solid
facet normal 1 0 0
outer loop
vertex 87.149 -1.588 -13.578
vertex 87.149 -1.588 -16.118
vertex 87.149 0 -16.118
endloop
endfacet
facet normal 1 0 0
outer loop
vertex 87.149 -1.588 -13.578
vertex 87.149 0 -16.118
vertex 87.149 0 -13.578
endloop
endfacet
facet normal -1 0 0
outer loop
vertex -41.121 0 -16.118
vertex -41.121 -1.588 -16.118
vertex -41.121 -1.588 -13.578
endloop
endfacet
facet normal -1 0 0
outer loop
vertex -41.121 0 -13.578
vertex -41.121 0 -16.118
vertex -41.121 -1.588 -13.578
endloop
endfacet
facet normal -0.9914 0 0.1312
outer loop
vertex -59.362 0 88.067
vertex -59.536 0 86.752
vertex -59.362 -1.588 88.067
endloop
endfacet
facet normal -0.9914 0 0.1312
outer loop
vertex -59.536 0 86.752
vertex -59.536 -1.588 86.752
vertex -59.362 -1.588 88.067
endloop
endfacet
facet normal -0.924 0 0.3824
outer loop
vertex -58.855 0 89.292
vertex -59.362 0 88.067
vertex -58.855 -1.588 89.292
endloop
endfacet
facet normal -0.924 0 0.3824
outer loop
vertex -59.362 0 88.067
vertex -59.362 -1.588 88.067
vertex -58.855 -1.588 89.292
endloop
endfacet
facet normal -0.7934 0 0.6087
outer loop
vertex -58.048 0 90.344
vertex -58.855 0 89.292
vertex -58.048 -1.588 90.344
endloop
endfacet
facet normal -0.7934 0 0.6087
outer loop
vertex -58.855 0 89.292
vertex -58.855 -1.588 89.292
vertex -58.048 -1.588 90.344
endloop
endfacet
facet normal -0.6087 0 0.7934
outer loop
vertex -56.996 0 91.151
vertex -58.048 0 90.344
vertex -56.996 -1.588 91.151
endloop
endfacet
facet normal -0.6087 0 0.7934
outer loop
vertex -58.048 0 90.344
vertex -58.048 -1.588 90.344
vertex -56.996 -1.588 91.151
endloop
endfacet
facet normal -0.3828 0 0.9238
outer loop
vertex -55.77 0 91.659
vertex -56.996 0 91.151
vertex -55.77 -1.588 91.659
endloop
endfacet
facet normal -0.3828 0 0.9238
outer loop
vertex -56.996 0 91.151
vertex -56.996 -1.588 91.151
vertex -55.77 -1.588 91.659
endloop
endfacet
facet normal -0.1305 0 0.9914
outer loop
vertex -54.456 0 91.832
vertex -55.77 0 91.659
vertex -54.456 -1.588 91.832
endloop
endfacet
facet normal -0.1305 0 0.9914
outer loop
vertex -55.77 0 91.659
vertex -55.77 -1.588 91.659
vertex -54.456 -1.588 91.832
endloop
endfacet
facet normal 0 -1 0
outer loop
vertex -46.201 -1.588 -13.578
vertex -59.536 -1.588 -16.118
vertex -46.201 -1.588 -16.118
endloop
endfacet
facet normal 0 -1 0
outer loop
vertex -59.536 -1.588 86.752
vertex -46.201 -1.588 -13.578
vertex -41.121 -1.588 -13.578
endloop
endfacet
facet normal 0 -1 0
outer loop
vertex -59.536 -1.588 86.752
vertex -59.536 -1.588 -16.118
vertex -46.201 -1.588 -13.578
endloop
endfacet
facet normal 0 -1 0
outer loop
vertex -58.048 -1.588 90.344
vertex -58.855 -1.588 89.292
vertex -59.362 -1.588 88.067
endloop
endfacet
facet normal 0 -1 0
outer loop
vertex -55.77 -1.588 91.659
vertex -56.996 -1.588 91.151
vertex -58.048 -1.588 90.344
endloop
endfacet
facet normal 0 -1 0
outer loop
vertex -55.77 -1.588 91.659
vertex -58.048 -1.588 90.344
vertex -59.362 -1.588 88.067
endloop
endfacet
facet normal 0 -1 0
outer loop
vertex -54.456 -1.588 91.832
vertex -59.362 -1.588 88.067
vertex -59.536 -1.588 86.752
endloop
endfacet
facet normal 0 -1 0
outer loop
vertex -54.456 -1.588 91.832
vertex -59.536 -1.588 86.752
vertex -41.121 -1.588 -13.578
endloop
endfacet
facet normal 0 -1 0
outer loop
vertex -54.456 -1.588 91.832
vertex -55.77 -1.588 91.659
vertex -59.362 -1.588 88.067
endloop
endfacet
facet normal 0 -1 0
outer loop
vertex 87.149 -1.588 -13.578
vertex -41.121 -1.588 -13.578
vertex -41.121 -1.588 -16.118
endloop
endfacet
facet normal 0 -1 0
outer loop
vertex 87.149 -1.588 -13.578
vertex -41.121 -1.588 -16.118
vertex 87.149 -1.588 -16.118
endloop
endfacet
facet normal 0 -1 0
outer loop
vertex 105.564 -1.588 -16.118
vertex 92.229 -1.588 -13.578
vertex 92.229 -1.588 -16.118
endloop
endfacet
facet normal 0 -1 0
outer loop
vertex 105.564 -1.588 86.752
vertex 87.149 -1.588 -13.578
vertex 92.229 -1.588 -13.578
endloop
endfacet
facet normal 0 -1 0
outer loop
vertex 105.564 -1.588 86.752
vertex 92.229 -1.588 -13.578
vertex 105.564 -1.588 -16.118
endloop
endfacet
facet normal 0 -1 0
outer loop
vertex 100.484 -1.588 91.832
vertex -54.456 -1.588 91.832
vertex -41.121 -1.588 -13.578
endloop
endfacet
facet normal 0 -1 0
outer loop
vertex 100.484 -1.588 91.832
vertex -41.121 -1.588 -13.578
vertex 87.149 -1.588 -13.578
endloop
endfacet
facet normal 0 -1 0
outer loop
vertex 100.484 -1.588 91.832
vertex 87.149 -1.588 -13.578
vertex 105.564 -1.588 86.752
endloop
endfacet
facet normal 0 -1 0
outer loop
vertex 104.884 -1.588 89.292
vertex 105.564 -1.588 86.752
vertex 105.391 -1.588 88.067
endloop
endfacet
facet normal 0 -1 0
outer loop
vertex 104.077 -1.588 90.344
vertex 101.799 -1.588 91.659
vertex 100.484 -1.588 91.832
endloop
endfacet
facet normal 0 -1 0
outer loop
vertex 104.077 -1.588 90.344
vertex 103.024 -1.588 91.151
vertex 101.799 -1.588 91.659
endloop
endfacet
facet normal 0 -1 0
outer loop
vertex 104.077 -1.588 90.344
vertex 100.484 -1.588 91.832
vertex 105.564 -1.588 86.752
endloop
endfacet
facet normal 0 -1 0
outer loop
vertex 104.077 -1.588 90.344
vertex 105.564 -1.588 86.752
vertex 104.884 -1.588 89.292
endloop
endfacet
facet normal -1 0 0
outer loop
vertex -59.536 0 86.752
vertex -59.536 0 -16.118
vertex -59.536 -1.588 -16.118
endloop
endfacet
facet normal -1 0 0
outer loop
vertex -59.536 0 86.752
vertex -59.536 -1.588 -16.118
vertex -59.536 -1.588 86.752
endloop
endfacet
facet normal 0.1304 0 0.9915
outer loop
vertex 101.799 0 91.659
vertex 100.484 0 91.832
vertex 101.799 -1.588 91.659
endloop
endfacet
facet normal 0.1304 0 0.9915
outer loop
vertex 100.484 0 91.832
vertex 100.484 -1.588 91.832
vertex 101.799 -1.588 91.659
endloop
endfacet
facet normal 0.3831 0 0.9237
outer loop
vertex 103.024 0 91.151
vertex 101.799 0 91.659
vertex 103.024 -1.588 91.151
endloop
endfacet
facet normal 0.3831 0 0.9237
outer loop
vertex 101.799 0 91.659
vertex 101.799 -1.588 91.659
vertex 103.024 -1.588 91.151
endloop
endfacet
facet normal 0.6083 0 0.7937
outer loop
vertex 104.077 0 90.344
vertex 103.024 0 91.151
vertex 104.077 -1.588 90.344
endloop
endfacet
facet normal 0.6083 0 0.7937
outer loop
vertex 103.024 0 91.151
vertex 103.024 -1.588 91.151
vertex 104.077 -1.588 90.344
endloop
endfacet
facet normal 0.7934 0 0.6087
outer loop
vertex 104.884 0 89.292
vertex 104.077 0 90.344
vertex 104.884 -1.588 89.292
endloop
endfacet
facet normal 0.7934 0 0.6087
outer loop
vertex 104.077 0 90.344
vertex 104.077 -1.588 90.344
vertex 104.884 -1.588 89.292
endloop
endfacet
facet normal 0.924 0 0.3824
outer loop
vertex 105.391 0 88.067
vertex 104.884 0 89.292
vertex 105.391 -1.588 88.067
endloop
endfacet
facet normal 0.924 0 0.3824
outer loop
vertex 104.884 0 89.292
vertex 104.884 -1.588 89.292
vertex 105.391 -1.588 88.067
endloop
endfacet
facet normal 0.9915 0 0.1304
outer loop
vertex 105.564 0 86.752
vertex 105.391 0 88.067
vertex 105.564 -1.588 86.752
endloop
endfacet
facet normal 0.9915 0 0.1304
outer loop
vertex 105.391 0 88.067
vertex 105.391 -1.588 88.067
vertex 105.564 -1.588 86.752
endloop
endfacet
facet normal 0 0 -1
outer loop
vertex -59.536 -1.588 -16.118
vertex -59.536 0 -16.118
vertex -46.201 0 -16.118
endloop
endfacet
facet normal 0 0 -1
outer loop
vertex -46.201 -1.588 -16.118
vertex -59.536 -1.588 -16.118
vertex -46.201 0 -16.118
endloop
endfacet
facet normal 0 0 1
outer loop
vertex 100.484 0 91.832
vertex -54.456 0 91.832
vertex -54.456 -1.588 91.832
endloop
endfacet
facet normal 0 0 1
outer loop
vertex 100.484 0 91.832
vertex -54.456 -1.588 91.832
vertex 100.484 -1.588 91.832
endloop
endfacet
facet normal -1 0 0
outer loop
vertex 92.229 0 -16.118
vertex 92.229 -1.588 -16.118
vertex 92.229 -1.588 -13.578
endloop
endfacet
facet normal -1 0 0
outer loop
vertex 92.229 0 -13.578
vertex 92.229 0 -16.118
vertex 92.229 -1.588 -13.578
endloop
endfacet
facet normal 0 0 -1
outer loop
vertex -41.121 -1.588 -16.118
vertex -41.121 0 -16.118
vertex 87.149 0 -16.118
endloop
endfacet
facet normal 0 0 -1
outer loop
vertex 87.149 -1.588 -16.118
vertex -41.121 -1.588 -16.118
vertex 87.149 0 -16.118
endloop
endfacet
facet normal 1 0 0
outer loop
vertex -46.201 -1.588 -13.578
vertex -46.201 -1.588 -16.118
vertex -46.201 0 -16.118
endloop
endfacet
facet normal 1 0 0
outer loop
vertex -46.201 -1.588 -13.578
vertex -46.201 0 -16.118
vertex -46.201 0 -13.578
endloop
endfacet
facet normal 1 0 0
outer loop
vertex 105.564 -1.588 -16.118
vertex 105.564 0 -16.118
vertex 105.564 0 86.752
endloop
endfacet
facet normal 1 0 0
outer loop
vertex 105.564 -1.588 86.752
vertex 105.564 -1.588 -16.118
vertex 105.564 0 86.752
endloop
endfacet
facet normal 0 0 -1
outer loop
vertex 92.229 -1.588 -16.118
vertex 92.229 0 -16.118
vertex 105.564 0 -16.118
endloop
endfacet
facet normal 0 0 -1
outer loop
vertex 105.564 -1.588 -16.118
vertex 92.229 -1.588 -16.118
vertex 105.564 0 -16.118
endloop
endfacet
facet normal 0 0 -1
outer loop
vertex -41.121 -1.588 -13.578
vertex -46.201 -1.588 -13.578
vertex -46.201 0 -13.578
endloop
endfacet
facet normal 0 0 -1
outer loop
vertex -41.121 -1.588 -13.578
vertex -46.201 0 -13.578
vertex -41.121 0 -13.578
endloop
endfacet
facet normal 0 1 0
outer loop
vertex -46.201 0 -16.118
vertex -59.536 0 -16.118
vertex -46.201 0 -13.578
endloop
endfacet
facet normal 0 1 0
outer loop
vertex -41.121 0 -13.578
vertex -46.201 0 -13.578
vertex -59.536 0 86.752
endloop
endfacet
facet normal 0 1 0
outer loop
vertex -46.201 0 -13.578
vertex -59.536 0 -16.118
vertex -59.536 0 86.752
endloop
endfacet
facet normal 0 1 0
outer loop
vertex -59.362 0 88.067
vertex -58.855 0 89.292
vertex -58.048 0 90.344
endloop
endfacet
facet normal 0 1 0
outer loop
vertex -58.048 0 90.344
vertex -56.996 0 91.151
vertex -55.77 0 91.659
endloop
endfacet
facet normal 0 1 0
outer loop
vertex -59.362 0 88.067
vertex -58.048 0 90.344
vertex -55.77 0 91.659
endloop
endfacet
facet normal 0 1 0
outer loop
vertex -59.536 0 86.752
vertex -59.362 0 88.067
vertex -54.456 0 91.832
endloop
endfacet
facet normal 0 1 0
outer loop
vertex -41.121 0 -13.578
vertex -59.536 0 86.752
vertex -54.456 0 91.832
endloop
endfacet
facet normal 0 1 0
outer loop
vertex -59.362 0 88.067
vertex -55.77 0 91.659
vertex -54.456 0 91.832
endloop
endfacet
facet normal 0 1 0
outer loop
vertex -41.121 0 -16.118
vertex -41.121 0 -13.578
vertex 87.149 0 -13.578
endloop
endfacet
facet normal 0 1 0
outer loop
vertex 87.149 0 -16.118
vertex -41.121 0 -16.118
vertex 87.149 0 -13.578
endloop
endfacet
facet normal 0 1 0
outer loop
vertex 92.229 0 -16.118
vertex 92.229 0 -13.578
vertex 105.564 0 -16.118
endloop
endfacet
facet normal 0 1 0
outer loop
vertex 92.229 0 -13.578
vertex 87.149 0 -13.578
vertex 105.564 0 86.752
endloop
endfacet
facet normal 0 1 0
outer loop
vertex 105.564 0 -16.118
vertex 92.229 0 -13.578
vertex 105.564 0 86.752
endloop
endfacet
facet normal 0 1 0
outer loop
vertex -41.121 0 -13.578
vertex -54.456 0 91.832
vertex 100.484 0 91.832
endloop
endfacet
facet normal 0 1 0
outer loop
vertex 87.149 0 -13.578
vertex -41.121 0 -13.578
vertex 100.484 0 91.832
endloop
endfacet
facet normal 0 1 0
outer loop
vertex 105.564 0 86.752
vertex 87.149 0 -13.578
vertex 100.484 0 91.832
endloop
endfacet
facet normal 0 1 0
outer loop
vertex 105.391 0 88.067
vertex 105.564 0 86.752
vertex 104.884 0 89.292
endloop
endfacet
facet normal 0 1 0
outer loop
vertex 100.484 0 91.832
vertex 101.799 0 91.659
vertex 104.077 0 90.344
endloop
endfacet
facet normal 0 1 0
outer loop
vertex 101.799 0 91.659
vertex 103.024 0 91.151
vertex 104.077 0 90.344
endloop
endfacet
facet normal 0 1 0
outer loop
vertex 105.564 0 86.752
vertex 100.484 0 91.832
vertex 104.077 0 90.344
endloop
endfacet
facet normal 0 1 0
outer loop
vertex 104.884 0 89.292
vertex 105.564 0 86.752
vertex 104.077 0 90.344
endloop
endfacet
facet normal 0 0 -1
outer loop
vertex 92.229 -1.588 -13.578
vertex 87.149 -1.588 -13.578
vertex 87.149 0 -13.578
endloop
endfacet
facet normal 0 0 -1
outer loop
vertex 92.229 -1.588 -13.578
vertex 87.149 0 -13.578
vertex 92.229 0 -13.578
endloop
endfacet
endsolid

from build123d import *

# Parameters (mm, degrees)
F0_W     = 165.1
F0_H     = 107.95
F1_DEPTH = 1.5875
F2_W     = 5.08
F2_H     = 2.54
F3_DEPTH = 25.4
F4_R     = 5.08


with BuildPart() as f1:
    # F0 (on Front) → F1 (new body)
    with BuildSketch(Plane.XZ):
        with Locations((23.014426, 37.856833)):
            Rectangle(F0_W, F0_H)
    extrude(amount=F1_DEPTH)

    # F2 (on face) → F3 (cut)
    with BuildSketch(Plane.XZ.offset(1.5875)):
        with Locations((-43.660574, -14.848167)):
            Rectangle(F2_W, F2_H)
        with Locations((89.689426, -14.848167)):
            Rectangle(F2_W, F2_H)
    extrude(amount=-F3_DEPTH, mode=Mode.SUBTRACT)

    # F4
    f4_edges = [f1.edges().sort_by_distance(p)[0] for p in [
        (105.564426, -0.79375, 91.831833),
        (-59.535574, -0.79375, 91.831833),
    ]]
    fillet(f4_edges, radius=F4_R)


solid = f1.part
